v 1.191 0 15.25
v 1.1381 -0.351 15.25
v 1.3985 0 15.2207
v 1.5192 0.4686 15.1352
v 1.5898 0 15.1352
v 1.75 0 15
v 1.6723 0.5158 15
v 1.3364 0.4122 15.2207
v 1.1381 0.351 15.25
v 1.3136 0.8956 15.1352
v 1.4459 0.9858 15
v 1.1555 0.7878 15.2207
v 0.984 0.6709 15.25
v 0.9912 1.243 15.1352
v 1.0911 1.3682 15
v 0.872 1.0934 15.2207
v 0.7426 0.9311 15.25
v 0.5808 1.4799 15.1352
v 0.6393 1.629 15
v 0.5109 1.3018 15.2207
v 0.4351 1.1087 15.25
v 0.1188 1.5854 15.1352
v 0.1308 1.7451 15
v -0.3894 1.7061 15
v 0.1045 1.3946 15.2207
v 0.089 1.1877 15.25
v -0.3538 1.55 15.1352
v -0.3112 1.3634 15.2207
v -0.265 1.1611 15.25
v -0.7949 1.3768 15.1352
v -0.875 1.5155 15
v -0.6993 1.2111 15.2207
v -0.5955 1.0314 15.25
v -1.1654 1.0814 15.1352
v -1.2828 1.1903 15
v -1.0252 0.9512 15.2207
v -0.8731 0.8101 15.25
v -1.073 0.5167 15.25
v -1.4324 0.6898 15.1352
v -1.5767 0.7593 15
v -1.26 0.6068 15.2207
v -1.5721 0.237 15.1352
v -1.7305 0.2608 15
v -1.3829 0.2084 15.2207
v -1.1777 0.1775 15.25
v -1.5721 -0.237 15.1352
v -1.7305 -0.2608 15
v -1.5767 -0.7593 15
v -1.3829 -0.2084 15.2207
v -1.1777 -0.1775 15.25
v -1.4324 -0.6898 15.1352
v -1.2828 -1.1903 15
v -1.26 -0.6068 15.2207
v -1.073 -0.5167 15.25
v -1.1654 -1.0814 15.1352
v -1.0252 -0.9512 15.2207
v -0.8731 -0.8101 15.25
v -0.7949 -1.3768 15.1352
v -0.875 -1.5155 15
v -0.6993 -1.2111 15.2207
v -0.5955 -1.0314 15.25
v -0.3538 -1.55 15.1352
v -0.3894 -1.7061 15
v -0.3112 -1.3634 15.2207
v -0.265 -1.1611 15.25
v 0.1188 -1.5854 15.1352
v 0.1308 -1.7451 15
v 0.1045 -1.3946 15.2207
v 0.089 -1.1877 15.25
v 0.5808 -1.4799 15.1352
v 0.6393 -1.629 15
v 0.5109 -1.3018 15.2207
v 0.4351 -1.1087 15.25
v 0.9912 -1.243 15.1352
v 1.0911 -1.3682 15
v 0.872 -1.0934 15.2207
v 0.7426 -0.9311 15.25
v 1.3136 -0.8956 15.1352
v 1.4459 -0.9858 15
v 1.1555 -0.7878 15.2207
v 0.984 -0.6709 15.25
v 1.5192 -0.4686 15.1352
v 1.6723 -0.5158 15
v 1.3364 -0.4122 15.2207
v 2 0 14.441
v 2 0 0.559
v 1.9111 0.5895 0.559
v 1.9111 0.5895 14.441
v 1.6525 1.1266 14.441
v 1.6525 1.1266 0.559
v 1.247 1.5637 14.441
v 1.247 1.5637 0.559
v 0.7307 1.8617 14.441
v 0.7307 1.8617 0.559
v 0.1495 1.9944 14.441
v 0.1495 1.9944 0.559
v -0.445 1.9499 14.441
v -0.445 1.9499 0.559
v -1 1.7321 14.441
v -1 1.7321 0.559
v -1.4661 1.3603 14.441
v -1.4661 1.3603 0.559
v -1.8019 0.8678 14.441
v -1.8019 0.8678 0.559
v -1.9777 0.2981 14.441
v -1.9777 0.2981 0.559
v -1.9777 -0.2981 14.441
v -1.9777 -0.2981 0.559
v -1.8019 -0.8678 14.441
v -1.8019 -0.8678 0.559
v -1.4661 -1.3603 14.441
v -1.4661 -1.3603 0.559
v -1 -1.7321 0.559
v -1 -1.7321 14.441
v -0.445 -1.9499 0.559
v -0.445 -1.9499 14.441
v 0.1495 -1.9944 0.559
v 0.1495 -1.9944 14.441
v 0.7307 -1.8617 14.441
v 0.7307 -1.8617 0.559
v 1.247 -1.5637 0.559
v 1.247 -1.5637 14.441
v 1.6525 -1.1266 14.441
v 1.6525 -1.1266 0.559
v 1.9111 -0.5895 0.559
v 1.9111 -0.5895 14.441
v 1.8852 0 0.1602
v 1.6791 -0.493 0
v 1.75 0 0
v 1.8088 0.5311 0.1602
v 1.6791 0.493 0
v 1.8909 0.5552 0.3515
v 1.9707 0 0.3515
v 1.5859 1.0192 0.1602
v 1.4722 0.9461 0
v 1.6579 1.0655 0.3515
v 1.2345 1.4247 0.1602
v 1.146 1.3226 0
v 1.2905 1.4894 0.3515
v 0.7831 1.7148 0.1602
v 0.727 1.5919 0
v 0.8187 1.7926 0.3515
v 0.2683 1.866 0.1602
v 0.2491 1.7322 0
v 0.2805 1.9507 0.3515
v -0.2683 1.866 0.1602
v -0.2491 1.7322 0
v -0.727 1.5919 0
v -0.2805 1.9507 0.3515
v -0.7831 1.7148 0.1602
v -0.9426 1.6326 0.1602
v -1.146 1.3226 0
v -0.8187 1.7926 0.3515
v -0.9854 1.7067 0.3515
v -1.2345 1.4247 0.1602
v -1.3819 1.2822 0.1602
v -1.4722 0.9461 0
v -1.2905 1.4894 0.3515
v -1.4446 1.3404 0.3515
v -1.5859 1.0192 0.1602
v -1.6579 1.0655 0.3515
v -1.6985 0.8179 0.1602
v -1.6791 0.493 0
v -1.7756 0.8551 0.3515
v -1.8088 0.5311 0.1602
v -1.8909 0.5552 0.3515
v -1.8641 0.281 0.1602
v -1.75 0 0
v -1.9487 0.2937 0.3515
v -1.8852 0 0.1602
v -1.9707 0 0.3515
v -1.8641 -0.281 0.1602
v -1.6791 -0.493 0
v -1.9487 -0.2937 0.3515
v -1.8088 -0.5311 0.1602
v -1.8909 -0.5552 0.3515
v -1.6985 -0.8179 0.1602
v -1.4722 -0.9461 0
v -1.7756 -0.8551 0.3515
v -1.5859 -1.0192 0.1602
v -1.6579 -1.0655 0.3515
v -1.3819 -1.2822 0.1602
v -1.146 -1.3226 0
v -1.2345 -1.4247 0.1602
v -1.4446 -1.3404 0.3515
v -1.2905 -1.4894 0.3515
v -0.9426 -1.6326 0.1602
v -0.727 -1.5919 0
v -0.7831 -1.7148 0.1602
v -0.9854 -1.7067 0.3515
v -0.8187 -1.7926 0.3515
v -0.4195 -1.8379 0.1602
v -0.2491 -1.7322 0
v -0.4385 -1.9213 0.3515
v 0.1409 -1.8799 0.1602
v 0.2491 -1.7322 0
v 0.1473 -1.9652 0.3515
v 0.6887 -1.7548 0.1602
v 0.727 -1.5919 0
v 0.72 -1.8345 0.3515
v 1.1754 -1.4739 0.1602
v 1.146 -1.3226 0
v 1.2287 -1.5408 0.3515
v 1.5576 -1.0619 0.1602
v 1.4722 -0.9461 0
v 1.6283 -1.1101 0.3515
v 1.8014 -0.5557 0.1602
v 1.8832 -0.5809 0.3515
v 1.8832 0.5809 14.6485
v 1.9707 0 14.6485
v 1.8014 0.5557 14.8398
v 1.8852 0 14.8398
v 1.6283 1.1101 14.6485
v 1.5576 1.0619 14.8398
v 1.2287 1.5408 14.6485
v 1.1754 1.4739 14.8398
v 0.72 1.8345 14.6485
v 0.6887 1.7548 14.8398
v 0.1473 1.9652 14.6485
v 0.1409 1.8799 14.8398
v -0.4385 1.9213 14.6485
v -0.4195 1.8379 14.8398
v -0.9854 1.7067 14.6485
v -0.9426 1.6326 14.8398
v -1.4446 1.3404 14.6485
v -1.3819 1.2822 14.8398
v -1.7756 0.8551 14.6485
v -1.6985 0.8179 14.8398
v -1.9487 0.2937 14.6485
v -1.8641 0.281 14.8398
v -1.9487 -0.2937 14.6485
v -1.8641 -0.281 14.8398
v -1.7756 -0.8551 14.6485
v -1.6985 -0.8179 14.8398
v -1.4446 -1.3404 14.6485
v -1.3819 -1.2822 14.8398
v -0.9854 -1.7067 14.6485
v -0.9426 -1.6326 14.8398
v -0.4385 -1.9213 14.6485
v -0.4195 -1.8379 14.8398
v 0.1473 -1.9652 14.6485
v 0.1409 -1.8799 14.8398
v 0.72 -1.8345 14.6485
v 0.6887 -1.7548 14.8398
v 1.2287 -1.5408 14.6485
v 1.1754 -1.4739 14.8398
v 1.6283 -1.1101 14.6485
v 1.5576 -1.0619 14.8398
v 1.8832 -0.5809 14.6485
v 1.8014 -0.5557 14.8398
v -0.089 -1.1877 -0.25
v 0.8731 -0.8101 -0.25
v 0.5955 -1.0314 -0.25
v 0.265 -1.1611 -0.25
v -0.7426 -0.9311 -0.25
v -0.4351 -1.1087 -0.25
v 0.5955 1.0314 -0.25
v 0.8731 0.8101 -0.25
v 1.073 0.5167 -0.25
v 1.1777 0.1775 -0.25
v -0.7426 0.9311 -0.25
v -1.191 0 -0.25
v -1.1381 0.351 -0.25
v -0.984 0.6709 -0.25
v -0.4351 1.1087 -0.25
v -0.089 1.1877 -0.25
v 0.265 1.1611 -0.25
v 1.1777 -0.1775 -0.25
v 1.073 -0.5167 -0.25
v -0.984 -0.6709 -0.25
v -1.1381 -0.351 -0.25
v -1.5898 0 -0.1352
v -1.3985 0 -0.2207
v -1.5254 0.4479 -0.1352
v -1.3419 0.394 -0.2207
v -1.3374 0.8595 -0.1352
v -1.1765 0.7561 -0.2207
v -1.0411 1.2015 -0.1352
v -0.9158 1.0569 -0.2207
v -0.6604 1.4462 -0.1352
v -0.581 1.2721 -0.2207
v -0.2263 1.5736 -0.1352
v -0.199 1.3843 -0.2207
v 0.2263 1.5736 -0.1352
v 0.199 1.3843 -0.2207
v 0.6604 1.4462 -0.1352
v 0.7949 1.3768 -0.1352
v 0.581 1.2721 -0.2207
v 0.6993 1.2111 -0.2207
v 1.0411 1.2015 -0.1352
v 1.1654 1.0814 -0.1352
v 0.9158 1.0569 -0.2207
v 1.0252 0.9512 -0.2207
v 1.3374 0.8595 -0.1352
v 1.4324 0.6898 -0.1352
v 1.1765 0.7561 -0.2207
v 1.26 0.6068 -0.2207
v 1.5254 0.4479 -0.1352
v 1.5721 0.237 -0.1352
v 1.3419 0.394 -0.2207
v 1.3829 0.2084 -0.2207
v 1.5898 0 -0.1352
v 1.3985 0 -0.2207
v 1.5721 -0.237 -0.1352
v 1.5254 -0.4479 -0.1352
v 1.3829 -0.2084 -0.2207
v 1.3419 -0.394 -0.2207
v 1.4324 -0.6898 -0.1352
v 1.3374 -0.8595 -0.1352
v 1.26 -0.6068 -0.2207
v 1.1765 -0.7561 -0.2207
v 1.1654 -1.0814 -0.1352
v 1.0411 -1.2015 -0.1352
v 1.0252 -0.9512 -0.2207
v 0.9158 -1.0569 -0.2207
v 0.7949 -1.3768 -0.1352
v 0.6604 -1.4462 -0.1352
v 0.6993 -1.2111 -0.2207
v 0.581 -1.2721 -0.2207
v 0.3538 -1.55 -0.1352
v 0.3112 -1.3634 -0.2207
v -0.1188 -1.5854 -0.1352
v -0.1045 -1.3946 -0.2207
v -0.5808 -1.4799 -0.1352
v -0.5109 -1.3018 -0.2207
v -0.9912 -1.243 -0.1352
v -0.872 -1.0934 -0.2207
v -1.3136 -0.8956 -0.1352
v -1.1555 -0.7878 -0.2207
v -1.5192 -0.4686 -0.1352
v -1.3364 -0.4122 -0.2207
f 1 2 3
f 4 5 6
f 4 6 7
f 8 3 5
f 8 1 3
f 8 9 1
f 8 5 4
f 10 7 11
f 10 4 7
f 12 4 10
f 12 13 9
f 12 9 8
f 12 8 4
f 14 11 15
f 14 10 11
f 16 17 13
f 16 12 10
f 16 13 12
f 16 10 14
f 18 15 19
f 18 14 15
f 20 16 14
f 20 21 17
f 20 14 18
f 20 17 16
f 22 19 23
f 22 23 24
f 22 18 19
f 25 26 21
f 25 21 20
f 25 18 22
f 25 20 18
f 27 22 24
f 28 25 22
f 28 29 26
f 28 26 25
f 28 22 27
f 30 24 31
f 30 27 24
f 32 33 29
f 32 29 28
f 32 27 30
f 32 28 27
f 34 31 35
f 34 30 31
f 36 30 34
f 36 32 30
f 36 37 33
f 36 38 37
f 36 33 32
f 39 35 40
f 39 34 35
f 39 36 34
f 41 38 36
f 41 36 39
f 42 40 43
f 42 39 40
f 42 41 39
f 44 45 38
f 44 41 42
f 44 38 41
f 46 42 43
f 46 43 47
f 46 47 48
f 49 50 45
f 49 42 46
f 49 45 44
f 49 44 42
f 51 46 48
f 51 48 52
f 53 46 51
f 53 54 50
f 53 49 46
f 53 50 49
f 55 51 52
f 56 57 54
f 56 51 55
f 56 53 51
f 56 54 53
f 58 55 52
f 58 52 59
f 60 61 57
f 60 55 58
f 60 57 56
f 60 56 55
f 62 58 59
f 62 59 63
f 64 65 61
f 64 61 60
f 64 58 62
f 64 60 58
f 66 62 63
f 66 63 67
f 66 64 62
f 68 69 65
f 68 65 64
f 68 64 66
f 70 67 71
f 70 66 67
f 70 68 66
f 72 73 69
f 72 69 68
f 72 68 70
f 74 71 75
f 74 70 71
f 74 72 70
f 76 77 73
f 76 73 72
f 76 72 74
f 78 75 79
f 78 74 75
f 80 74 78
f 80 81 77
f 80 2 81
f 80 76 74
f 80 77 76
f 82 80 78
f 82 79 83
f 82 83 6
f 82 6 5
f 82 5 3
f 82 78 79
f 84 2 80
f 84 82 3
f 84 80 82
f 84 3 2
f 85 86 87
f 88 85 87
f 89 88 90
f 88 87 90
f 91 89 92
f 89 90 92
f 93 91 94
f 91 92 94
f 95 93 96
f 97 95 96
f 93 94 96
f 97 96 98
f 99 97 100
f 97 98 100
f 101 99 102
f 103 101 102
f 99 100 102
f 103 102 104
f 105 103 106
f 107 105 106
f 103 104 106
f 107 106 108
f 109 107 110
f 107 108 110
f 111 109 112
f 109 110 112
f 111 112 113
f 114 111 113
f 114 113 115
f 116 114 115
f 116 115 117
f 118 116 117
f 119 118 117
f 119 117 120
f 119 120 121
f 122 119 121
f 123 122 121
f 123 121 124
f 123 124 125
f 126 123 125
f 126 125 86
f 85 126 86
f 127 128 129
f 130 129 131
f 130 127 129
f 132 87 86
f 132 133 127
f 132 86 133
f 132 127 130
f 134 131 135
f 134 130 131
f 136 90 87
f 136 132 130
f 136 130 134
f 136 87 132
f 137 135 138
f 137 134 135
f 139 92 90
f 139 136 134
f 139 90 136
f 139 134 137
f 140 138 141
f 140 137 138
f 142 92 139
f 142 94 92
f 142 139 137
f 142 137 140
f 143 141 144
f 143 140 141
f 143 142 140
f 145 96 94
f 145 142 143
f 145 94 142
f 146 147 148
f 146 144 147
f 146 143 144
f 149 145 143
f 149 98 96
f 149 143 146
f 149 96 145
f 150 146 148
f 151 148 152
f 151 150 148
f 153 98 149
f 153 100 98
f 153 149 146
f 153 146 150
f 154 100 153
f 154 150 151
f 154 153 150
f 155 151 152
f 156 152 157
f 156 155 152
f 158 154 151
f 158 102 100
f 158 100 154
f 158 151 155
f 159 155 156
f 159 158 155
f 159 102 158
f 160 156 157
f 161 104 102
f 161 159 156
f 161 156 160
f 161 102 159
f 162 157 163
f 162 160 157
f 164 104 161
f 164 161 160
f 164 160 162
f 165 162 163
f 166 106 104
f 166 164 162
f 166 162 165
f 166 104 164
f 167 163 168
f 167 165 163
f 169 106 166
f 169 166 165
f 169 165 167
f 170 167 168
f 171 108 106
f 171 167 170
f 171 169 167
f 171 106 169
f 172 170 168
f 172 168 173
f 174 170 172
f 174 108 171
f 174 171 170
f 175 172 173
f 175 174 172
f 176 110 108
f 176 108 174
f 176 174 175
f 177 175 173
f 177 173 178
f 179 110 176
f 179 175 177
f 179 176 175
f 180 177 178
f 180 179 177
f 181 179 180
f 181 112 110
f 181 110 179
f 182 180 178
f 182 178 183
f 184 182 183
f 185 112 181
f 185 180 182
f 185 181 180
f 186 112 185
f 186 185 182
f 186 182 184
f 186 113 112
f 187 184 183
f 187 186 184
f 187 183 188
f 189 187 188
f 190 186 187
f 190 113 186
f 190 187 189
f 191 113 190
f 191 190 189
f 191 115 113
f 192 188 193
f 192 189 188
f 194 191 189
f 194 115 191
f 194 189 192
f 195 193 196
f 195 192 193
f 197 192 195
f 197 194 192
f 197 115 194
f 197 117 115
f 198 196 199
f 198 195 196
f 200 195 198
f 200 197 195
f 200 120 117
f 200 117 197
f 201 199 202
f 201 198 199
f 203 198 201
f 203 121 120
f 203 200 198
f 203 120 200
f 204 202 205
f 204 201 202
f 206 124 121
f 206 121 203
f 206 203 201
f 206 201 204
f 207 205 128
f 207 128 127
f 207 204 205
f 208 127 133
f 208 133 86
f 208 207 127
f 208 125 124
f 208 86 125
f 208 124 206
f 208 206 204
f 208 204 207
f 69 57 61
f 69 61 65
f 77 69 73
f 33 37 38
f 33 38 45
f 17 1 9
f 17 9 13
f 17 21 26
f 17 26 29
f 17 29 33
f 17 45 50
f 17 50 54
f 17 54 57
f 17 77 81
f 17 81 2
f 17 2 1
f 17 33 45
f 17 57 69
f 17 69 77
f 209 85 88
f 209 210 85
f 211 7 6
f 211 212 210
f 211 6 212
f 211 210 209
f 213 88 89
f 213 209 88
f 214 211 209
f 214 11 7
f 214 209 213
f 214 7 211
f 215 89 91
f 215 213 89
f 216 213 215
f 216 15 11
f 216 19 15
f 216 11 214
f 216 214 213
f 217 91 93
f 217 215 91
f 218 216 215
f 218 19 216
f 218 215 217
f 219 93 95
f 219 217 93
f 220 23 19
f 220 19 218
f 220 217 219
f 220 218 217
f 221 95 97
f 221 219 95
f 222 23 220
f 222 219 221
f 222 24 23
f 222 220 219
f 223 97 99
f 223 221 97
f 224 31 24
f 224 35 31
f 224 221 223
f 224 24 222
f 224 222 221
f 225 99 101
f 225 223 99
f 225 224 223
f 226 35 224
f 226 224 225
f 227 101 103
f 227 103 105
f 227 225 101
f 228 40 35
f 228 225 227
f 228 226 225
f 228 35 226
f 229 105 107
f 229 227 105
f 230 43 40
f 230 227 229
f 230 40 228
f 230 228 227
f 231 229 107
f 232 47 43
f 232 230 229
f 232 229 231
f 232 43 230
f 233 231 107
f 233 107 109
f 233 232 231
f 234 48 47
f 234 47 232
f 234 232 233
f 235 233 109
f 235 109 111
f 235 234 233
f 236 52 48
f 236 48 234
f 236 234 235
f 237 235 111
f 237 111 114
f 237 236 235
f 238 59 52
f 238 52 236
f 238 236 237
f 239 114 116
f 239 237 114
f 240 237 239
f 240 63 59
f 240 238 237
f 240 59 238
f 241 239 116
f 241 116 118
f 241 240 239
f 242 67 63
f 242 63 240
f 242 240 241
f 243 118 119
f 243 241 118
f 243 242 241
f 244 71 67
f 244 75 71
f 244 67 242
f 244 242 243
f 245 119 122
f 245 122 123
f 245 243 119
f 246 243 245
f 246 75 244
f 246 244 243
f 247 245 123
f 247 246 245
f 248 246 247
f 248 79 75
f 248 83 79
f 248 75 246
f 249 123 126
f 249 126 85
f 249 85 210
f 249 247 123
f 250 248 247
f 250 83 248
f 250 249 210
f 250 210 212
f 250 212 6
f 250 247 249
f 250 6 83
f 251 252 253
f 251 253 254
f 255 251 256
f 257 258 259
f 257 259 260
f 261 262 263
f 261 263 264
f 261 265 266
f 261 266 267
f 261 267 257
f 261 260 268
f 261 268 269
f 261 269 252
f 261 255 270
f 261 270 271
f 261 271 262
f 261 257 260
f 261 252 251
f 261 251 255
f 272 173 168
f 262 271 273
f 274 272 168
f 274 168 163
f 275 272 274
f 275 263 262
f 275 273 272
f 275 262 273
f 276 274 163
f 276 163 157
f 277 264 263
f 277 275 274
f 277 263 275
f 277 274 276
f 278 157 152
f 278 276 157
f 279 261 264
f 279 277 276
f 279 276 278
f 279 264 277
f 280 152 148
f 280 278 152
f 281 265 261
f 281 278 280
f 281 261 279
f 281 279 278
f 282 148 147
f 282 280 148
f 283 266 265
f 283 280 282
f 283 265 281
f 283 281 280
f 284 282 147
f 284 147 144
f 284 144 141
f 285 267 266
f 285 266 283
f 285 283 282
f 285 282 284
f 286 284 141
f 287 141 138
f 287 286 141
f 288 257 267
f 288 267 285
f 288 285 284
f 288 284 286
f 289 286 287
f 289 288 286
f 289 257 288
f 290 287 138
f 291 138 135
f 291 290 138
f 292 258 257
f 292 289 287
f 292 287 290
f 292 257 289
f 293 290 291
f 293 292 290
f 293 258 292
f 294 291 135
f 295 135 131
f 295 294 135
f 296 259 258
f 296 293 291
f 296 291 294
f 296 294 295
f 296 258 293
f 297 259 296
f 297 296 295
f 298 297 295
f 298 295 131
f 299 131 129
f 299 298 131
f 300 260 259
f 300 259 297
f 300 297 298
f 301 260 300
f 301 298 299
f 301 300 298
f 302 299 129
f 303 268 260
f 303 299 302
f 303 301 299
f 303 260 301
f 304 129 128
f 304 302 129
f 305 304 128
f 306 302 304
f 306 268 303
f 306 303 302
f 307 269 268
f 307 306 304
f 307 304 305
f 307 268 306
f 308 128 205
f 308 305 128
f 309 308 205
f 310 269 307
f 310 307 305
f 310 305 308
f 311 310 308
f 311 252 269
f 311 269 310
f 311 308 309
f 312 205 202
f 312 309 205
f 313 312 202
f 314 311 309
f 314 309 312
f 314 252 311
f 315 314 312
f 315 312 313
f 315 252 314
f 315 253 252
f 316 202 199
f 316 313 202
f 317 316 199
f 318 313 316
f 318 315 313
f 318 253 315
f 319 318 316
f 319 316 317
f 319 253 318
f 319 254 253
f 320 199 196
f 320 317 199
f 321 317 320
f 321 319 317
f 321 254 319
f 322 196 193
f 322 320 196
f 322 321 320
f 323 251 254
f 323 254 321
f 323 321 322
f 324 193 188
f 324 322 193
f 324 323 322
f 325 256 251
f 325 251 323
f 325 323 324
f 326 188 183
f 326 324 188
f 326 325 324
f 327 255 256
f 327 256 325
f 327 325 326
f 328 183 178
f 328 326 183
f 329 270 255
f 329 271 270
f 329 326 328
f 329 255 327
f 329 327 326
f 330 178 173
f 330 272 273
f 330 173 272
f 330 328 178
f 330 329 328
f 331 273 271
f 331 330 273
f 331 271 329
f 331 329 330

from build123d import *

# Parameters (mm, degrees)
SKETCH4_R           = 2
BOSS_EXTRUDE2_DEPTH = 15
SKETCH5_R           = 1.75
BOSS_EXTRUDE3_DEPTH = 0.25
FILLET3_R           = 0.75
SKETCH6_R           = 1.75
BOSS_EXTRUDE4_DEPTH = 0.25
FILLET4_R           = 0.75


with BuildPart() as part:
    # Sketch4 → Boss-Extrude2 (new body)
    with BuildSketch(Plane.XY):
        Circle(SKETCH4_R)
    extrude(amount=BOSS_EXTRUDE2_DEPTH)

    # Sketch5 → Boss-Extrude3 (add)
    with BuildSketch(Plane.XY.offset(15)):
        Circle(SKETCH5_R)
    extrude(amount=BOSS_EXTRUDE3_DEPTH)

    # Fillet3
    # the kernel refuses this fillet: 0.75 mm, written as the material it takes off along each edge
    with BuildSketch(Plane(origin=(0, 0, 15), x_dir=(1, 0, 0), z_dir=(0, -1, 0))) as fillet3_piece_1:
        with BuildLine():
            CenterArc((1.25, -0.559016994), FILLET3_R, 0, 48.189685104)
            Line((1.75, 0), (1.76, 0.01118034))
            ThreePointArc((1.76, 0.01118034), (1.875, 0.015), (2, 0.015))
            Line((2, 0.015), (2.015, 0))
            Line((2.015, 0), (2.015, -0.559016994))
            Line((2.015, -0.559016994), (2, -0.559016994))
        make_face()
    revolve(axis=Axis((0, 0, 15), (0, 0, 1)), mode=Mode.SUBTRACT)
    with BuildSketch(Plane(origin=(0, 0, 15.25), x_dir=(1, 0, 0), z_dir=(0, -1, 0))) as fillet3_piece_2:
        with BuildLine():
            CenterArc((1.190983006, -0.75), FILLET3_R, 41.810314896, 48.189685104)
            Line((1.190983006, 0), (1.190983006, 0.015))
            Line((1.190983006, 0.015), (1.75, 0.015))
            Line((1.75, 0.015), (1.765, 0))
            ThreePointArc((1.765, 0), (1.765, -0.125), (1.76118034, -0.24))
            Line((1.76118034, -0.24), (1.75, -0.25))
        make_face()
    revolve(axis=Axis((0, 0, 15.25), (0, 0, 1)), mode=Mode.SUBTRACT)

    # Sketch6 → Boss-Extrude4 (add)
    with BuildSketch(Plane(origin=(0, 0, 0), x_dir=(-1, 0, 0), z_dir=(0, 0, -1))):
        Circle(SKETCH6_R)
    extrude(amount=BOSS_EXTRUDE4_DEPTH)

    # Fillet4
    # the kernel refuses this fillet: 0.75 mm, written as the material it takes off along each edge
    with BuildSketch(Plane(origin=(0, 0, -0.25), x_dir=(-1, 0, 0), z_dir=(0, -1, 0))) as fillet4_piece_1:
        with BuildLine():
            CenterArc((1.190983006, -0.75), FILLET4_R, 41.810314896, 48.189685104)
            Line((1.190983006, 0), (1.190983006, 0.015))
            Line((1.190983006, 0.015), (1.75, 0.015))
            Line((1.75, 0.015), (1.765, 0))
            ThreePointArc((1.765, 0), (1.765, -0.125), (1.76118034, -0.24))
            Line((1.76118034, -0.24), (1.75, -0.25))
        make_face()
    revolve(axis=Axis((0, 0, -0.25), (0, 0, -1)), mode=Mode.SUBTRACT)
    with BuildSketch(Plane(origin=(0, 0, 0), x_dir=(1, 0, 0), z_dir=(0, -1, 0))) as fillet4_piece_2:
        with BuildLine():
            CenterArc((1.25, 0.559016994), FILLET4_R, 311.810314896, 48.189685104)
            Line((1.75, 0), (1.76, -0.01118034))
            ThreePointArc((1.76, -0.01118034), (1.875, -0.015), (2, -0.015))
            Line((2, -0.015), (2.015, 0))
            Line((2.015, 0), (2.015, 0.559016994))
            Line((2.015, 0.559016994), (2, 0.559016994))
        make_face()
    revolve(axis=Axis((0, 0, 0), (0, 0, 1)), mode=Mode.SUBTRACT)


solid = part.part
